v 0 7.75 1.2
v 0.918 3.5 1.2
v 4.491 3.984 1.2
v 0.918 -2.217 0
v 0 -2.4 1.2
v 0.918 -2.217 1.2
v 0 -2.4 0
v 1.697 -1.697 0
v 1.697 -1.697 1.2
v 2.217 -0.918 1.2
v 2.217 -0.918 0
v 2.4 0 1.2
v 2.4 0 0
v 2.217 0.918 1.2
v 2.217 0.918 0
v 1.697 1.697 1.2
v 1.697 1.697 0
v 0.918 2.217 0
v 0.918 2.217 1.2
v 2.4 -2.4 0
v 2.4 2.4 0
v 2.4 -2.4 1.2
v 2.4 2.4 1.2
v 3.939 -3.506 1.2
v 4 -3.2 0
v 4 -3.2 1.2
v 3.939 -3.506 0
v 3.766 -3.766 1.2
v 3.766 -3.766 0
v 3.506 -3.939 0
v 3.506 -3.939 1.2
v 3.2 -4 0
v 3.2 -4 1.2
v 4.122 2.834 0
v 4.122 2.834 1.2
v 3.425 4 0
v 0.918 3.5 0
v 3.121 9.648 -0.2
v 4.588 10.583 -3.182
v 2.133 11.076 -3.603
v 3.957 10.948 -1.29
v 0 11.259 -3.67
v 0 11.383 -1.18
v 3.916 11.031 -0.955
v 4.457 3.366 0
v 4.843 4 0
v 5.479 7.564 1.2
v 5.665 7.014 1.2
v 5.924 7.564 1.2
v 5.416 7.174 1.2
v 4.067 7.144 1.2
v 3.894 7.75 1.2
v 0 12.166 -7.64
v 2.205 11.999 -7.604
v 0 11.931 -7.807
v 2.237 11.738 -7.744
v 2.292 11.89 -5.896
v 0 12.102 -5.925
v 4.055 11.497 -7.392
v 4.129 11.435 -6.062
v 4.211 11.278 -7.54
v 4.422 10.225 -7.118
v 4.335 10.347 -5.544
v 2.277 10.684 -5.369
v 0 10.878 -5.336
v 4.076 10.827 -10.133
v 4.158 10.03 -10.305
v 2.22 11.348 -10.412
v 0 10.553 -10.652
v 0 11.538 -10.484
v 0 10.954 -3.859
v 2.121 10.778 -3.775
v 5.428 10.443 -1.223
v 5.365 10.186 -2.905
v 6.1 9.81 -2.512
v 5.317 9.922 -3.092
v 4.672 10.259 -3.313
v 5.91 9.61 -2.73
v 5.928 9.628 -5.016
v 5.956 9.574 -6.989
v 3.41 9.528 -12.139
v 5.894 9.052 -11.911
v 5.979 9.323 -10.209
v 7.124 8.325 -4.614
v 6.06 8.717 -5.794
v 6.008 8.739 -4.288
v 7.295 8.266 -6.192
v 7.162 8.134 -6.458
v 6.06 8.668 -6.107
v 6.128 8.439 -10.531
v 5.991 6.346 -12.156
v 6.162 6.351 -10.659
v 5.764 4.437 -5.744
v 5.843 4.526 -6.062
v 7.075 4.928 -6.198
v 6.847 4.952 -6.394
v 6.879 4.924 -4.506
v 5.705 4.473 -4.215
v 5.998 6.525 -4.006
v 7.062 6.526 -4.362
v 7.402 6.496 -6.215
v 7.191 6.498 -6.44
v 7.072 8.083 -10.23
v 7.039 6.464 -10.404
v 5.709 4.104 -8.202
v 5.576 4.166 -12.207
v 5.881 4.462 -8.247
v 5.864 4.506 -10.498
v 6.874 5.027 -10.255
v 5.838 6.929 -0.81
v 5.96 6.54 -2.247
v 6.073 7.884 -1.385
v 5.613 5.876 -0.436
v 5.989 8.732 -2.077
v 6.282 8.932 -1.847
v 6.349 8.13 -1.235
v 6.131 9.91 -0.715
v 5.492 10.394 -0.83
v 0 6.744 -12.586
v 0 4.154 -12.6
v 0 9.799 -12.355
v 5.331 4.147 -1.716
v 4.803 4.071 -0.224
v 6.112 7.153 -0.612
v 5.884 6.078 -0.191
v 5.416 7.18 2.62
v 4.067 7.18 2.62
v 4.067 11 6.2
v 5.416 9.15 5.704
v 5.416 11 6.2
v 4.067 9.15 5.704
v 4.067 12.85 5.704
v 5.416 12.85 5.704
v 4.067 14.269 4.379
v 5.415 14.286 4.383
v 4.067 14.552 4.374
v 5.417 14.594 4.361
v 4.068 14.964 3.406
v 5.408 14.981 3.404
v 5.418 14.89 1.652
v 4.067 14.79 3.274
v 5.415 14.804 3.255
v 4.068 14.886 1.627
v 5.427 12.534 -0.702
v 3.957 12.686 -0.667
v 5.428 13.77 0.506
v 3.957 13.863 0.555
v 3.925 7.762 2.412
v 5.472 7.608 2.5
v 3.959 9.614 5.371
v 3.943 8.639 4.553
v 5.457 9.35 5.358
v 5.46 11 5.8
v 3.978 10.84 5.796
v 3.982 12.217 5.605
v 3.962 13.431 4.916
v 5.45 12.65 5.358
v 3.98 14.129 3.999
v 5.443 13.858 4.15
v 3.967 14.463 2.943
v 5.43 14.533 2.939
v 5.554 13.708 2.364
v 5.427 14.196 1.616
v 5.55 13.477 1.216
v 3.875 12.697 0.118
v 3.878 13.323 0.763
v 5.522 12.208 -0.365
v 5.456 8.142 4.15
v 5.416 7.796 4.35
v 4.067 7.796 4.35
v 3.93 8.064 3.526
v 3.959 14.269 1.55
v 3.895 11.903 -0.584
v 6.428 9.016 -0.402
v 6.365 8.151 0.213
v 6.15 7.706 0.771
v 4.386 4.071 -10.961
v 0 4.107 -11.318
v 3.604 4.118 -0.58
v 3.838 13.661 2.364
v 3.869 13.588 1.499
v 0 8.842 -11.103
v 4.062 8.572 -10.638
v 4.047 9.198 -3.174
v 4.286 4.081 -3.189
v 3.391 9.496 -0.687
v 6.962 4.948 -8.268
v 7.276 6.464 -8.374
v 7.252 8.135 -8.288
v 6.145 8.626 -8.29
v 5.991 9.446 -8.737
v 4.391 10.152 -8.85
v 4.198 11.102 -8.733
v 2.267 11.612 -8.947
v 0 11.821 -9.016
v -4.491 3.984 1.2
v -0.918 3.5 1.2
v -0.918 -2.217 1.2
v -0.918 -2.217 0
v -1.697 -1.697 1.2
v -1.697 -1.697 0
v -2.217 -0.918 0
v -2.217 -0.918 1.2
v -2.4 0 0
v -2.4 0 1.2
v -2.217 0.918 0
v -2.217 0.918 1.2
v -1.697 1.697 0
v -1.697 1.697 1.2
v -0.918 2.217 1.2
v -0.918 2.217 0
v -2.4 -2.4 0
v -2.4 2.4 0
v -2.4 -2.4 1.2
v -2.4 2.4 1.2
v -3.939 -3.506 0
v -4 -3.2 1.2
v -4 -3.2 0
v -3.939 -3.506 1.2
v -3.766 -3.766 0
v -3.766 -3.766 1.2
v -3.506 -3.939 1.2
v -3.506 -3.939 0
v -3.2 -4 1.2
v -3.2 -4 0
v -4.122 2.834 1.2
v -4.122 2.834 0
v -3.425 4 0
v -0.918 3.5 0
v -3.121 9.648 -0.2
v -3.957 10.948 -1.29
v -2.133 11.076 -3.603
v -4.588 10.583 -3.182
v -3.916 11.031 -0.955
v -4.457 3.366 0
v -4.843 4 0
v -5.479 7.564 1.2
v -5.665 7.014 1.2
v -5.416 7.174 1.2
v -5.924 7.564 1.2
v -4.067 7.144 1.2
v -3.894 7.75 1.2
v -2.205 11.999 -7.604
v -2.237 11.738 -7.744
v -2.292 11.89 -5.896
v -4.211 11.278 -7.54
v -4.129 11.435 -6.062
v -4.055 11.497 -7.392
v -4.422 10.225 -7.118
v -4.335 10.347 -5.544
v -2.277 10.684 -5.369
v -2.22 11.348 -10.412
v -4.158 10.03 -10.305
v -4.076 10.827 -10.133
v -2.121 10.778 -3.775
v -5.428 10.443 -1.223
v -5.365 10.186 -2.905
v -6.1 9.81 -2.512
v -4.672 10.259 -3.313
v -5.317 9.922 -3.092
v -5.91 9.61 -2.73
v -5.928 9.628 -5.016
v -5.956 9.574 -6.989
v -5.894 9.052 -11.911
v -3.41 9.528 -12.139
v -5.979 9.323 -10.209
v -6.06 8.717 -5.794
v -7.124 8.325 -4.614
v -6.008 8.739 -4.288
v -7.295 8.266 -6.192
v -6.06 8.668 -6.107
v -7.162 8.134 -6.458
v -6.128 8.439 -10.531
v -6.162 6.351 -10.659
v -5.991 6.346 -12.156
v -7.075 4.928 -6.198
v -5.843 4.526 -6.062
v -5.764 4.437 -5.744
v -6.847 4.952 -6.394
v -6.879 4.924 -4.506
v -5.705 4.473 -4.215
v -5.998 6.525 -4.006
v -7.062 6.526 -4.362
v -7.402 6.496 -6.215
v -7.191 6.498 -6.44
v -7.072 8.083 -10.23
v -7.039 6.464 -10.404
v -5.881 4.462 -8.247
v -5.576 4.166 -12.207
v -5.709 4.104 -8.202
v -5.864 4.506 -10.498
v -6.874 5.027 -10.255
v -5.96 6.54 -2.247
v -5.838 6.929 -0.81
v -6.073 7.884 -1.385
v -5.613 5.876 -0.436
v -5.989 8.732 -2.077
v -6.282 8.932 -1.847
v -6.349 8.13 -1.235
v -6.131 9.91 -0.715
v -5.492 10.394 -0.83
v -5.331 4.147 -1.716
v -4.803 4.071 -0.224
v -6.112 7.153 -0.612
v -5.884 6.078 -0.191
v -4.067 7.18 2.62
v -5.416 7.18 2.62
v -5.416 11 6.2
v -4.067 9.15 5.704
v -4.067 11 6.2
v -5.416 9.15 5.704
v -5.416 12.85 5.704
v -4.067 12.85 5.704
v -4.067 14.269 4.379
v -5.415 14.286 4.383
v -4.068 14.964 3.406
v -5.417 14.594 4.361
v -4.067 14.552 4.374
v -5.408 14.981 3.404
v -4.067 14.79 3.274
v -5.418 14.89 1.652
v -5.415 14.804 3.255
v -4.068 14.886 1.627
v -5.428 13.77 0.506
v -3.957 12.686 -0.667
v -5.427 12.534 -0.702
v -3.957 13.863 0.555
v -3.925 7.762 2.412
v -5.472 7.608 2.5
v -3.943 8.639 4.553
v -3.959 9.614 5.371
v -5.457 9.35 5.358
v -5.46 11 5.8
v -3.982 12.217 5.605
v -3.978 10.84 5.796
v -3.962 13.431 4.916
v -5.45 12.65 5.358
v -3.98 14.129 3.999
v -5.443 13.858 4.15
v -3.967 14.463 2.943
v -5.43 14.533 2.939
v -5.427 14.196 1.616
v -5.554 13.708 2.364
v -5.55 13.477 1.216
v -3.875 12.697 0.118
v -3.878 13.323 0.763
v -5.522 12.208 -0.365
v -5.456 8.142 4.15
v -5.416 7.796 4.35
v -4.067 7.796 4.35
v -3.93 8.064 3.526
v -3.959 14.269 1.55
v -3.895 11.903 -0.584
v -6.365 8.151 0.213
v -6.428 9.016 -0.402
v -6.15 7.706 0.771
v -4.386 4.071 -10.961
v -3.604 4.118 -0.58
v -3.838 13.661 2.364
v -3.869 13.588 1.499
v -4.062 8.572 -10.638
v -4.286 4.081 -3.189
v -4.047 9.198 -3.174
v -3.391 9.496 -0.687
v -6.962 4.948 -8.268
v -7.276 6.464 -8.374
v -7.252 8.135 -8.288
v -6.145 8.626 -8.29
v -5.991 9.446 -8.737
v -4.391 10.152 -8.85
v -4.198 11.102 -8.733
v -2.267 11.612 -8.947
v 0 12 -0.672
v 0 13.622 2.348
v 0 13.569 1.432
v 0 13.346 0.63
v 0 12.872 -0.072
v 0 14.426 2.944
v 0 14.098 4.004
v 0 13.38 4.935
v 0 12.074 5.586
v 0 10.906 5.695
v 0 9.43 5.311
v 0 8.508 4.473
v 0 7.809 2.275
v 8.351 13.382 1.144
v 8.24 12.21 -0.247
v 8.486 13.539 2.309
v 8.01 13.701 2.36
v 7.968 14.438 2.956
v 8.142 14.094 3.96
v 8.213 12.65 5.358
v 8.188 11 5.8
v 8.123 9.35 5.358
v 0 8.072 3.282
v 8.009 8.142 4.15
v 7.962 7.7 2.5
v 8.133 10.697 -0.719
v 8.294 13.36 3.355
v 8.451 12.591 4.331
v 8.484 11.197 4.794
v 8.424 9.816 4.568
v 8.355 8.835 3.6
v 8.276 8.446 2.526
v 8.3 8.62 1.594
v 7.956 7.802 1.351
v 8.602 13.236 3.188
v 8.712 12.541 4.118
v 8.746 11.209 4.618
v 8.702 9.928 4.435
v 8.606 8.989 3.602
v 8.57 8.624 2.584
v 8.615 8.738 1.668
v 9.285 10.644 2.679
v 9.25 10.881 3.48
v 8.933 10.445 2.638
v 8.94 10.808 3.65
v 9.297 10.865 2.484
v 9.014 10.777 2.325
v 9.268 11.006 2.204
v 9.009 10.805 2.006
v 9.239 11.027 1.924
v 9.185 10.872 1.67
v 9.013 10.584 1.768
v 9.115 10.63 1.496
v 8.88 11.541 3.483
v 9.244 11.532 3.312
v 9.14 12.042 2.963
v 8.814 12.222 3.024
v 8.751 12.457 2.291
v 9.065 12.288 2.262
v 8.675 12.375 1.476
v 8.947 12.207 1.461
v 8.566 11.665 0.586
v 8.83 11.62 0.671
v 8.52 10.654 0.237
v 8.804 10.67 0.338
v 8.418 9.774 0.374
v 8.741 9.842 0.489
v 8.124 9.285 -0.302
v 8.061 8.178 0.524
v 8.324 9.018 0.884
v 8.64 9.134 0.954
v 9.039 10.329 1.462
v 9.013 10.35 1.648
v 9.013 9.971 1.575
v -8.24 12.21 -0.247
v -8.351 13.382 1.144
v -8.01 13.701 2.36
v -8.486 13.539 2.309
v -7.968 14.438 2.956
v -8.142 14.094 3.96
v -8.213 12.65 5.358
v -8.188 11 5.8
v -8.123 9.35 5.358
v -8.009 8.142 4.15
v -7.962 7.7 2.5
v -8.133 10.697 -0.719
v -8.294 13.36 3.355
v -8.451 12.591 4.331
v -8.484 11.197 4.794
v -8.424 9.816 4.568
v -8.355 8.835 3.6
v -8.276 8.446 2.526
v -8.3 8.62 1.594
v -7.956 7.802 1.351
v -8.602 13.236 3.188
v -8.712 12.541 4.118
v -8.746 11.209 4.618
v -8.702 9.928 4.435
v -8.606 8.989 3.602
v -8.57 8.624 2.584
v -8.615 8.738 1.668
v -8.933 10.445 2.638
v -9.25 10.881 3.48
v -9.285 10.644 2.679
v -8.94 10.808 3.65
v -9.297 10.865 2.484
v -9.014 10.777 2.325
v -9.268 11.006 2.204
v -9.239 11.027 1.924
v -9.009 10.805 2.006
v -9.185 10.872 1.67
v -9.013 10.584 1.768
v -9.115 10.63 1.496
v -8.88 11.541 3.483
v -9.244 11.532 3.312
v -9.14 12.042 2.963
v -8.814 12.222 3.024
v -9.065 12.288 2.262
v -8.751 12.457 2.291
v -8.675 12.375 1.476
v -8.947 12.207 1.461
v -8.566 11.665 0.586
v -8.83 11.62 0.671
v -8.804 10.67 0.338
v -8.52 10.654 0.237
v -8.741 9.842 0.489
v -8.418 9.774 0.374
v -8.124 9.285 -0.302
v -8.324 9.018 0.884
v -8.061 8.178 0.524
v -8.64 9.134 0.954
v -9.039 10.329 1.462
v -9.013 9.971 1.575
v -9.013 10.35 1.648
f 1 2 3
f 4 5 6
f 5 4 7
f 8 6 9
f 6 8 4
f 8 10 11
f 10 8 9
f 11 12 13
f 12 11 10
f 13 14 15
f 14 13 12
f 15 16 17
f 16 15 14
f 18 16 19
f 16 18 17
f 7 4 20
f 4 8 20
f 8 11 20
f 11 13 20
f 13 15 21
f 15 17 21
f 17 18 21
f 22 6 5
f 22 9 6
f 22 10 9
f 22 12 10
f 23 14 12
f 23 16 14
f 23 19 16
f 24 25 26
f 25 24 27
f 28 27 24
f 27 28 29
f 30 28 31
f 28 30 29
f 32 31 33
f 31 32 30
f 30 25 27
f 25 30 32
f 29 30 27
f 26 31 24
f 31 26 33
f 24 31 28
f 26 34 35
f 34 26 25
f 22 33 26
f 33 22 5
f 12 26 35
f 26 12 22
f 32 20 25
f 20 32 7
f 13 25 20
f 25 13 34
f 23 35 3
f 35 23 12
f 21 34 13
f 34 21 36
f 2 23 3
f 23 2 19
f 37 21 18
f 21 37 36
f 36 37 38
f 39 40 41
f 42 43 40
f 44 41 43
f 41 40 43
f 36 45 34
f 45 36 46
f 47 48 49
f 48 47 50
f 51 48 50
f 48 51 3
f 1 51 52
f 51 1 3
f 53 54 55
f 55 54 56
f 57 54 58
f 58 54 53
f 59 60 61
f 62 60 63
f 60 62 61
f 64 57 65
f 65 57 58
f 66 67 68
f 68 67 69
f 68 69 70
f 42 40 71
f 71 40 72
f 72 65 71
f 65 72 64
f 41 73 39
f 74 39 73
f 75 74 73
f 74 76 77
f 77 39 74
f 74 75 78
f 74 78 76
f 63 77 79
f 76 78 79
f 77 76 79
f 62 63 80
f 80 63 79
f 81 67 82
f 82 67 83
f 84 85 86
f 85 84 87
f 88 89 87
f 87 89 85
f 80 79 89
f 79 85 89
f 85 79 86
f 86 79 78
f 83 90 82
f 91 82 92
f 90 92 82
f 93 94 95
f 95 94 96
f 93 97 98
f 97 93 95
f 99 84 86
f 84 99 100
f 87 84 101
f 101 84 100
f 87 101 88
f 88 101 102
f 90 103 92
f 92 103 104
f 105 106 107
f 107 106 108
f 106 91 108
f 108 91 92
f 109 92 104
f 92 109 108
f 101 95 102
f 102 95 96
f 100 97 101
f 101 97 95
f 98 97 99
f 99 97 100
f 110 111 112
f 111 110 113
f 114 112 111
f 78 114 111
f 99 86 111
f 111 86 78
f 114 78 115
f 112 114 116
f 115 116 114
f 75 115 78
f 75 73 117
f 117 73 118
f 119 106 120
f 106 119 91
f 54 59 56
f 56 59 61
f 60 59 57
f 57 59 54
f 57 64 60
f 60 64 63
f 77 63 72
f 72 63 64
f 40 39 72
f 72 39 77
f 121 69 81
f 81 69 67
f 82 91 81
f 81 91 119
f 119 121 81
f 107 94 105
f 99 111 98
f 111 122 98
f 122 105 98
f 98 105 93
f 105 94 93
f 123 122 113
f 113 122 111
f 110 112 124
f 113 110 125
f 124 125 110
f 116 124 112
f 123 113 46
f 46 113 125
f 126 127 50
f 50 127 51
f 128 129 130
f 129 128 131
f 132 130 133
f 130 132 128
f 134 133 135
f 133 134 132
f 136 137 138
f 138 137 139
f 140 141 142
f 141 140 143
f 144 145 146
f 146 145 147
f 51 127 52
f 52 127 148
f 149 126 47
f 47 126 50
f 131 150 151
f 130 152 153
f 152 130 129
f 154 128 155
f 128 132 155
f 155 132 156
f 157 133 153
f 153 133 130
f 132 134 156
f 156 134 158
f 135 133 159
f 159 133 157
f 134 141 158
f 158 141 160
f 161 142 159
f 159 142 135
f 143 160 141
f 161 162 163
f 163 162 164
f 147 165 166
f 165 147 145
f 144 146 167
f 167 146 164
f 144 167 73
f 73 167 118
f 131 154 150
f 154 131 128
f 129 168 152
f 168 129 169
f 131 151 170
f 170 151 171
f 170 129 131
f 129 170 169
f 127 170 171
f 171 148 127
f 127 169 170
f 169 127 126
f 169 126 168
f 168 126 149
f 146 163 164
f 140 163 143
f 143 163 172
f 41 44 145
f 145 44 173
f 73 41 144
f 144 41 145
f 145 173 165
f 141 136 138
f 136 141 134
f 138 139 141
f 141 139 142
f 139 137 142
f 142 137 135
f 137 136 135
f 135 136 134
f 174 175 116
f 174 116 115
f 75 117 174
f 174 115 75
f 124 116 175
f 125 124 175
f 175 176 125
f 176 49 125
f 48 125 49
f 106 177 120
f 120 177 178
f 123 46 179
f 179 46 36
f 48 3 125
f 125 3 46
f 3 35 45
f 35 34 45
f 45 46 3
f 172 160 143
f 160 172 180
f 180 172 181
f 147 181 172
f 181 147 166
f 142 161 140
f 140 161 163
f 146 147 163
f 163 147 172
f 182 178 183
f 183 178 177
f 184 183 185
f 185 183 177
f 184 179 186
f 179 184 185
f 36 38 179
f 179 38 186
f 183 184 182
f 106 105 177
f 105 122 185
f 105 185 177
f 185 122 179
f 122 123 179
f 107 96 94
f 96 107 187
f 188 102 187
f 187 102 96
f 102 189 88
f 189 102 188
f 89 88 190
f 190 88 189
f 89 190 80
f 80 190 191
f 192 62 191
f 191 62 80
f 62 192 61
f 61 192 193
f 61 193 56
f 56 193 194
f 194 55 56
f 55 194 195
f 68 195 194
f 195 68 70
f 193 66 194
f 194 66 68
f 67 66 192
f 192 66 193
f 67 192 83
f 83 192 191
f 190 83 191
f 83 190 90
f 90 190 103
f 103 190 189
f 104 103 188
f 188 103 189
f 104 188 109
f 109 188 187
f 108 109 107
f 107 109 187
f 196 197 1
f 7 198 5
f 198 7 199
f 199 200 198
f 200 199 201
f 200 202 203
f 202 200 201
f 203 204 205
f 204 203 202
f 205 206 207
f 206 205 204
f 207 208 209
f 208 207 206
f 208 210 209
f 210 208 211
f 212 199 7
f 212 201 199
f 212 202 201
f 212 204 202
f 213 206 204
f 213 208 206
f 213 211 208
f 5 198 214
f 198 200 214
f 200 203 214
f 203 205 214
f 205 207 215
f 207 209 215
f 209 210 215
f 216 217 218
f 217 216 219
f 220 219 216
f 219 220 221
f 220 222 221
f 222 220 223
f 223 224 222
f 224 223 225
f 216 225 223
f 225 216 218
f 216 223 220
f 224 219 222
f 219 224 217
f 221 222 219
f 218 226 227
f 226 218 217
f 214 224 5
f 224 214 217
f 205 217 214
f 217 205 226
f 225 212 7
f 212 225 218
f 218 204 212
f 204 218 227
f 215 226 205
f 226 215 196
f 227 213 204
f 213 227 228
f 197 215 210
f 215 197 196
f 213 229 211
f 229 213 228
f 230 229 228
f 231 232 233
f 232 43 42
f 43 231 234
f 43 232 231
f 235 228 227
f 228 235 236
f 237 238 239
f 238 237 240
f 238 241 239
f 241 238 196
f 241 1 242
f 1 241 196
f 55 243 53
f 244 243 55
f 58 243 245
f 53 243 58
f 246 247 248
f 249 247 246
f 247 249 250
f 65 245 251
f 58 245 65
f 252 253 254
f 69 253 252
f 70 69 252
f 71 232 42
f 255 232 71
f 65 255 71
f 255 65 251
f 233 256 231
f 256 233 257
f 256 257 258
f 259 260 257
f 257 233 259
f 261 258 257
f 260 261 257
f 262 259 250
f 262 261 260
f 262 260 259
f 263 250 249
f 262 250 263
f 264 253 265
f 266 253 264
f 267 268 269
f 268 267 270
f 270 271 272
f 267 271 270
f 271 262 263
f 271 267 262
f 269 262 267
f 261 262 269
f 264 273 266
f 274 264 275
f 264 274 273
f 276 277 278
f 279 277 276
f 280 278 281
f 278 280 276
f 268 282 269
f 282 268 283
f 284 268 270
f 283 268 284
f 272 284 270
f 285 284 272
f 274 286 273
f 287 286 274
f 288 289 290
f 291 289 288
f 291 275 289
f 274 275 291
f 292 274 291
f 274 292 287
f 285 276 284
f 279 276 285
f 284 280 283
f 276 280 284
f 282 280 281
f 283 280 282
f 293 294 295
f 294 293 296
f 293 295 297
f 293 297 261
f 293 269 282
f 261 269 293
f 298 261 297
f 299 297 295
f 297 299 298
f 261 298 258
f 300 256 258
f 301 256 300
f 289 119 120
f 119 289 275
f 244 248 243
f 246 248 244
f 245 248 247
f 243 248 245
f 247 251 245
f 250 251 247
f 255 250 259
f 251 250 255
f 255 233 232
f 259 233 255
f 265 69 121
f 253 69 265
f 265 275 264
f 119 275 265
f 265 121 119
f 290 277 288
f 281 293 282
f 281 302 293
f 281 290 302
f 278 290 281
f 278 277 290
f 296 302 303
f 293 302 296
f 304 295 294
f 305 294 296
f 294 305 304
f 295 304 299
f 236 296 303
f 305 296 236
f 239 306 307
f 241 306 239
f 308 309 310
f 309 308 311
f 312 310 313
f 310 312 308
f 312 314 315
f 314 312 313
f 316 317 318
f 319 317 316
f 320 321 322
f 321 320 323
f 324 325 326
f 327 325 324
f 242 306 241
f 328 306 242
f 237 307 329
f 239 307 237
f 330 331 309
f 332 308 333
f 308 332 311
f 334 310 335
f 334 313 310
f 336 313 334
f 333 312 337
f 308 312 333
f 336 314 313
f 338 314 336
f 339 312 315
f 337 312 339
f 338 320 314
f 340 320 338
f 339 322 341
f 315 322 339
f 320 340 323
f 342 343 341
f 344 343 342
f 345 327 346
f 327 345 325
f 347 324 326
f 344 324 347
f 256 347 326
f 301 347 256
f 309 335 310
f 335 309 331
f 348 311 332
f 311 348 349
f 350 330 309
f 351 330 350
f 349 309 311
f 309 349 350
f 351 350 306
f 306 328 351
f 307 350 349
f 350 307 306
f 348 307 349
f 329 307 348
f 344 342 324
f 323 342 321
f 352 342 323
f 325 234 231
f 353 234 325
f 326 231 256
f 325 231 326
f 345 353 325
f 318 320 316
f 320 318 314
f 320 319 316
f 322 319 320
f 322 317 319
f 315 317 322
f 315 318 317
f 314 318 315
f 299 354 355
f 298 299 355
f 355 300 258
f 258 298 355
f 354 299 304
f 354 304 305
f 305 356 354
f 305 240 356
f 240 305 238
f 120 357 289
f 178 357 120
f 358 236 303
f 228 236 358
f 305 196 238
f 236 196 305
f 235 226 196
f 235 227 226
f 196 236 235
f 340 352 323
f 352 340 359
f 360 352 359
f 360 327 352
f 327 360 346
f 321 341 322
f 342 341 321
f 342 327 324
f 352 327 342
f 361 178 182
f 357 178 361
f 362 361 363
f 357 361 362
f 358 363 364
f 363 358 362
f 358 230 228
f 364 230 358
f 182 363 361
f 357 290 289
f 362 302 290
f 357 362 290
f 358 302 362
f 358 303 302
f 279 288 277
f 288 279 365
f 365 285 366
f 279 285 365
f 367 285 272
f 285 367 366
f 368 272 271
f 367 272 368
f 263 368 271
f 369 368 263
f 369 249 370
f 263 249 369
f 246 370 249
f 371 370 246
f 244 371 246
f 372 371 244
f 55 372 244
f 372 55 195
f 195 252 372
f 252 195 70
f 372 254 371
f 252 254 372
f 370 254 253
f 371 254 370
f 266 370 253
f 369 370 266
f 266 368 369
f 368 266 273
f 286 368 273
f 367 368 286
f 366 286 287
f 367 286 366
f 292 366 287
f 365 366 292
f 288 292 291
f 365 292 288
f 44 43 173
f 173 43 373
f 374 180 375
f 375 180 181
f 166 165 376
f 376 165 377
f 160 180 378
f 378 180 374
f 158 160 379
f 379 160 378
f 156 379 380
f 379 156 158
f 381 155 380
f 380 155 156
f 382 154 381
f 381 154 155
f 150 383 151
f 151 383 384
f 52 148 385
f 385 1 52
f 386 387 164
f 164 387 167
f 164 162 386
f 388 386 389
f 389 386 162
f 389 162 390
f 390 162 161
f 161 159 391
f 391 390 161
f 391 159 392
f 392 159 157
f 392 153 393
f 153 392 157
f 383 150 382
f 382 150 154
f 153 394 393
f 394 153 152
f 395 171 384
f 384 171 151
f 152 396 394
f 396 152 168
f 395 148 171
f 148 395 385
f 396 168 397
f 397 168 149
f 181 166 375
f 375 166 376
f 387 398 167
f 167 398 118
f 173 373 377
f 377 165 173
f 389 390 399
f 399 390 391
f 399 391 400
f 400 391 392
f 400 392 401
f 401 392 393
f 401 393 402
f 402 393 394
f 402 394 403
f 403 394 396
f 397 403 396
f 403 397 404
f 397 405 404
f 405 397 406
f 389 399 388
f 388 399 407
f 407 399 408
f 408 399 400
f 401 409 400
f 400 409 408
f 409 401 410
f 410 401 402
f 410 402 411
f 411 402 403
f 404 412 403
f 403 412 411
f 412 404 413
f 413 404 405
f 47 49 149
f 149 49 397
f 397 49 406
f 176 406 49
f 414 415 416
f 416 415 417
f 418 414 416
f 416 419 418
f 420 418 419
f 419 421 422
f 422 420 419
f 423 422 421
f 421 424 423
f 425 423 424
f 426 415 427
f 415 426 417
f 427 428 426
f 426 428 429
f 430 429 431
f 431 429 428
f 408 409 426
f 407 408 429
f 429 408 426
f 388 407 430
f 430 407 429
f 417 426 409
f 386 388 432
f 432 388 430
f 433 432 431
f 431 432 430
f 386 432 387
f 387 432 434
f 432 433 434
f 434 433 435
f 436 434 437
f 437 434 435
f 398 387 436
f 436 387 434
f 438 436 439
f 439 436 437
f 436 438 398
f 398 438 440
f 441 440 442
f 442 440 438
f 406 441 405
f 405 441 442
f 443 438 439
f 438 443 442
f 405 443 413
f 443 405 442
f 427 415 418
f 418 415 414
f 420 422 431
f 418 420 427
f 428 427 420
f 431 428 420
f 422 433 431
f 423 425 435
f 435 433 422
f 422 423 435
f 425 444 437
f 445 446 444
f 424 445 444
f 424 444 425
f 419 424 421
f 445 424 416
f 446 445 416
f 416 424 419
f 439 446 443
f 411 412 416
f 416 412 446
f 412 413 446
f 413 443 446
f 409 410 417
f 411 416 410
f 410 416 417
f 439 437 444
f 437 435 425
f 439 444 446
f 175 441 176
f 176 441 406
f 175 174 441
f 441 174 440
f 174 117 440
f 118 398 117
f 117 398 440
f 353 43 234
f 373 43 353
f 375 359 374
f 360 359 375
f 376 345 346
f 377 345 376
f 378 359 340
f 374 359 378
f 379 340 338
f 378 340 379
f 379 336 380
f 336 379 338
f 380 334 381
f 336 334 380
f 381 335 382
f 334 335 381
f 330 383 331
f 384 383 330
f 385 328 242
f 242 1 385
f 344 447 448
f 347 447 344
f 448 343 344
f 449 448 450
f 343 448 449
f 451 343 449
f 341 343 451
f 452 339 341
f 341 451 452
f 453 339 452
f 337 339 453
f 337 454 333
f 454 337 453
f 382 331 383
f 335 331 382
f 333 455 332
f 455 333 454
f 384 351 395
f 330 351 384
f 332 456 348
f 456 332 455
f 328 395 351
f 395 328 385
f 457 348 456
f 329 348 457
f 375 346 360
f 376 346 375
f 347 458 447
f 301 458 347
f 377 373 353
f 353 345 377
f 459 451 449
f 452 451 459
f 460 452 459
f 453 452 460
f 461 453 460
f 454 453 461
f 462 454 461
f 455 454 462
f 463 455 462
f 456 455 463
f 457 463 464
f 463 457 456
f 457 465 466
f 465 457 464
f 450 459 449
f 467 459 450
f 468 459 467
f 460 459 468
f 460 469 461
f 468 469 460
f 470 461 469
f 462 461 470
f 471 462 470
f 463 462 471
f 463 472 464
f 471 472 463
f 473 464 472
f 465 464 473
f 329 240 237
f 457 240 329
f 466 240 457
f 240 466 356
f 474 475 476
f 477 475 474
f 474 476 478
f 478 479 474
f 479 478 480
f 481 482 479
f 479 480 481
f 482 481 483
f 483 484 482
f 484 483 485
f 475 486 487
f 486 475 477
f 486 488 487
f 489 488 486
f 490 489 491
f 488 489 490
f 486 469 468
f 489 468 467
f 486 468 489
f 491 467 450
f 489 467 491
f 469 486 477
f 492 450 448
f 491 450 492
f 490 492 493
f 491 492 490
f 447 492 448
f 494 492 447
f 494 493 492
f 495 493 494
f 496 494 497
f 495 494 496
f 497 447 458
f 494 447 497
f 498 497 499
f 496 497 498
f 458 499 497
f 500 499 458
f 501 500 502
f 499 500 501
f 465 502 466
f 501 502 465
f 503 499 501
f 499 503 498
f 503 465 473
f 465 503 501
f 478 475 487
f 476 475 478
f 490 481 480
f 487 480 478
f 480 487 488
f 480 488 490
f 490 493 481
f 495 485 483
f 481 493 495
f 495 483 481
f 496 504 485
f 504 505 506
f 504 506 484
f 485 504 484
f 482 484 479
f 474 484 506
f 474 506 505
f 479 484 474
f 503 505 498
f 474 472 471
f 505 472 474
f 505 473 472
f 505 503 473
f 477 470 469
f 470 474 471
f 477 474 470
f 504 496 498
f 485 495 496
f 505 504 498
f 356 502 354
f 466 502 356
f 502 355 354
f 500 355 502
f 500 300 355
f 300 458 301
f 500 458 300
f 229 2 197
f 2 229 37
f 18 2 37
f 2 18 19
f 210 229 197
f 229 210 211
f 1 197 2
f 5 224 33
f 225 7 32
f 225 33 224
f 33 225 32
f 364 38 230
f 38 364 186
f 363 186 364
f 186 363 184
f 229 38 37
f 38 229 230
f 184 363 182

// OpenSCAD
use <../lib.scad>
use <../p/box3u2p.scad>
use <../p/rect2p.scad>
use <s/26073s01.scad>
use <s/26073s02.scad>
$fa=1; $fs=0.2;
function ldraw_lib__26073p02(realsolid=false) = [
// 0 Minifig Backpack with Three Pouches and Lime Bedroll Pattern
// 0 Name: 26073p02.dat
// 0 Author: Gerald Lasser [GeraldLasser]
// 0 !LDRAW_ORG Part UPDATE 2022-04
// 0 !LICENSE Licensed under CC BY 2.0 and CC BY 4.0 : see CAreadme.txt
// 
// 0 BFC CERTIFY CCW
  [0,"BFC","CERTIFY"],
  [0,"BFC","CCW"],
// 
// 0 !CATEGORY Minifig Neckwear
// 
// 0 !HISTORY 2022-07-18 [PTadmin] Official Update 2022-04
// 
// 
// 1 16 0 0 0 1 0 0 0 1 0 0 0 1 s\26073s01.dat
  [1,16,0,0,0,1,0,0,0,1,0,0,0,1, ldraw_lib__s__26073s01(realsolid)],
// 1 16 0 0 0 -1 0 0 0 1 0 0 0 1 s\26073s01.dat
  [1,16,0,0,0,-1,0,0,0,1,0,0,0,1, ldraw_lib__s__26073s01(realsolid)],
// 1 27 0 0 0 1 0 0 0 1 0 0 0 1 s\26073s02.dat
  [1,27,0,0,0,1,0,0,0,1,0,0,0,1, ldraw_lib__s__26073s02(realsolid)],
// 1 27 0 0 0 -1 0 0 0 1 0 0 0 1 s\26073s02.dat
  [1,27,0,0,0,-1,0,0,0,1,0,0,0,1, ldraw_lib__s__26073s02(realsolid)],
// 
// 0 BFC INVERTNEXT
  [0,"BFC","INVERTNEXT"],
// 1 16 0 -1.5 5.5434 0 0 2.2962 1.5 0 0 0 3.2066 0 box3u2p.dat
  [1,16,0,-1.5,5.5434,0,0,2.2962,1.5,0,0,0,3.2066,0, ldraw_lib__box3u2p(realsolid)],
// 3 16 0 -3 19.374 -2.2962 -3 8.75 2.2962 -3 8.75
  [3,16,0,-3,19.374,-2.2962,-3,8.75,2.2962,-3,8.75],
// 3 16 0 -3 -6 -8 -3 -10 8 -3 -10
  [3,16,0,-3,-6,-8,-3,-10,8,-3,-10],
// 3 16 -8 0 -10 0 0 -6 8 0 -10
  [3,16,-8,0,-10,0,0,-6,8,0,-10],
// 1 16 0 -1.5 -10 -8 0 0 0 0 1.5 0 1 0 rect2p.dat
  [1,16,0,-1.5,-10,-8,0,0,0,0,1.5,0,1,0, ldraw_lib__rect2p(realsolid)],
// 2 24 7.802 .499 24.119 -7.802 .499 24.119
  [2,24,7.802,.499,24.119,-7.802,.499,24.119],
// 
// 4 16 7.802 .499 24.119 -7.802 .499 24.119 -8.477 1.717 23.739 8.477 1.717 23.739
  [4,16,7.802,.499,24.119,-7.802,.499,24.119,-8.477,1.717,23.739,8.477,1.717,23.739],
// 4 16 10.117 7.934 22.995 8.477 1.717 23.739 -8.477 1.717 23.739 -10.117 7.934 22.995
  [4,16,10.117,7.934,22.995,8.477,1.717,23.739,-8.477,1.717,23.739,-10.117,7.934,22.995],
// 4 16 2.2962 0 8.75 -2.2962 0 8.75 -7.802 .499 24.119 7.802 .499 24.119
  [4,16,2.2962,0,8.75,-2.2962,0,8.75,-7.802,.499,24.119,7.802,.499,24.119],
// 3 16 10.117 7.934 22.995 -10.117 7.934 22.995 0 27.758 22.106
  [3,16,10.117,7.934,22.995,-10.117,7.934,22.995,0,27.758,22.106],
// 5 24 8.477 1.717 23.739 -8.477 1.717 23.739 7.802 .499 24.119 10.117 7.934 22.995
  [5,24,8.477,1.717,23.739,-8.477,1.717,23.739,7.802,.499,24.119,10.117,7.934,22.995],
// 5 24 -10.117 7.934 22.995 10.117 7.934 22.995 8.477 1.717 23.739 10.156 26.595 21.431
  [5,24,-10.117,7.934,22.995,10.117,7.934,22.995,8.477,1.717,23.739,10.156,26.595,21.431],
// 5 24 10.117 7.934 22.995 0 27.758 22.106 10.156 26.595 21.431 -10.117 7.934 22.995
  [5,24,10.117,7.934,22.995,0,27.758,22.106,10.156,26.595,21.431,-10.117,7.934,22.995],
// 5 24 0 27.758 22.106 -10.117 7.934 22.995 10.117 7.934 22.995 -10.156 26.595 21.431
  [5,24,0,27.758,22.106,-10.117,7.934,22.995,10.117,7.934,22.995,-10.156,26.595,21.431],
// 
// 0 // Seam
// 5 24 0 31.466 16.86 0 31.501 10.384 -14.977 30.389 15.864 13.94 30.517 10.414
  [5,24,0,31.466,16.86,0,31.501,10.384,-14.977,30.389,15.864,13.94,30.517,10.414],
// 5 24 0 30.888 24.497 0 31.466 16.86 8.525 30.348 23.819 -8.525 30.348 23.819
  [5,24,0,30.888,24.497,0,31.466,16.86,8.525,30.348,23.819,-8.525,30.348,23.819],
// 5 24 0 26.629 26.383 0 30.888 24.497 8.525 30.348 23.819 -8.525 30.348 23.819
  [5,24,0,26.629,26.383,0,30.888,24.497,8.525,30.348,23.819,-8.525,30.348,23.819],
// 5 24 0 26.629 26.383 0 26.211 28.844 5.549 26.03 28.371 -5.549 26.03 28.371
  [5,24,0,26.629,26.383,0,26.211,28.844,5.549,26.03,28.371,-5.549,26.03,28.371],
// 5 24 0 22.541 29.553 0 26.211 28.844 -5.667 22.367 29.03 5.549 26.03 28.371
  [5,24,0,22.541,29.553,0,26.211,28.844,-5.667,22.367,29.03,5.549,26.03,28.371],
// 5 24 0 22.541 29.553 0 19.518 29.827 -5.667 22.367 29.03 5.592 19.361 29.344
  [5,24,0,22.541,29.553,0,19.518,29.827,-5.667,22.367,29.03,5.592,19.361,29.344],
// 5 24 0 19.518 29.827 0 19.101 30.416 -5.512 19.01 29.997 5.512 19.01 29.997
  [5,24,0,19.518,29.827,0,19.101,30.416,-5.512,19.01,29.997,5.512,19.01,29.997],
// 5 24 0 14.812 30.254 0 19.101 30.416 5.512 19.01 29.997 -5.512 19.01 29.997
  [5,24,0,14.812,30.254,0,19.101,30.416,5.512,19.01,29.997,-5.512,19.01,29.997],
// 5 24 0 13.34 27.194 0 14.812 30.254 5.731 14.739 29.726 -5.731 14.739 29.726
  [5,24,0,13.34,27.194,0,14.812,30.254,5.731,14.739,29.726,-5.731,14.739,29.726],
// 5 24 0 13.34 27.194 0 9.647 27.386 5.303 9.437 26.946 -5.693 13.422 26.709
  [5,24,0,13.34,27.194,0,9.647,27.386,5.303,9.437,26.946,-5.693,13.422,26.709],
// 5 24 0 9.647 27.386 0 9.174 28.147 5.332 9.008 27.69 -5.332 9.008 27.69
  [5,24,0,9.647,27.386,0,9.174,28.147,5.332,9.008,27.69,-5.332,9.008,27.69],
// 5 24 0 9.174 28.147 0 2.95 28.458 -5.332 9.008 27.69 5.332 9.008 27.69
  [5,24,0,9.174,28.147,0,2.95,28.458,-5.332,9.008,27.69,5.332,9.008,27.69],
// 5 24 0 1.68 29.999 0 2.95 28.458 -9.738 1.231 29.578 9.738 1.231 29.578
  [5,24,0,1.68,29.999,0,2.95,28.458,-9.738,1.231,29.578,9.738,1.231,29.578],
// 5 24 0 .179 32.18 0 1.68 29.999 9.687 -.296 31.742 -9.738 1.231 29.578
  [5,24,0,.179,32.18,0,1.68,29.999,9.687,-.296,31.742,-9.738,1.231,29.578],
// 5 24 0 -1.576 33.365 0 .179 32.18 9.687 -.296 31.742 -9.687 -.296 31.742
  [5,24,0,-1.576,33.365,0,.179,32.18,9.687,-.296,31.742,-9.687,-.296,31.742],
// 5 24 0 -3.579 33.922 0 -1.576 33.365 9.696 -1.907 33.307 -9.696 -1.907 33.307
  [5,24,0,-3.579,33.922,0,-1.576,33.365,9.696,-1.907,33.307,-9.696,-1.907,33.307],
// 5 24 0 -3.579 33.922 0 -5.871 34.055 9.594 -5.911 34.153 -9.594 -5.911 34.153
  [5,24,0,-3.579,33.922,0,-5.871,34.055,9.594,-5.911,34.153,-9.594,-5.911,34.153],
// 5 24 0 -5.871 34.055 0 -7.36 36.065 9.594 -5.911 34.153 -9.594 -5.911 34.153
  [5,24,0,-5.871,34.055,0,-7.36,36.065,9.594,-5.911,34.153,-9.594,-5.911,34.153],
// 5 24 0 -10.009 35.245 0 -7.36 36.065 9.918 -7.358 36.157 -9.918 -7.358 36.157
  [5,24,0,-10.009,35.245,0,-7.36,36.065,9.918,-7.358,36.157,-9.918,-7.358,36.157],
// 5 24 0 -12.337 33.451 0 -10.009 35.245 9.904 -12.291 33.578 -9.95 -9.997 35.323
  [5,24,0,-12.337,33.451,0,-10.009,35.245,9.904,-12.291,33.578,-9.95,-9.997,35.323],
// 5 24 0 -13.966 30.184 0 -12.337 33.451 9.956 -14.012 30.543 -9.956 -14.012 30.543
  [5,24,0,-13.966,30.184,0,-12.337,33.451,9.956,-14.012,30.543,-9.956,-14.012,30.543],
// 5 24 0 -14.238 27.264 0 -13.966 30.184 -9.946 -14.489 27.1 9.946 -14.489 27.1
  [5,24,0,-14.238,27.264,0,-13.966,30.184,-9.946,-14.489,27.1,9.946,-14.489,27.1],
// 5 24 0 -5.688 19.523 0 -3 19.374 -9.812 -6.029 19.404 9.735 -3 19.374
  [5,24,0,-5.688,19.523,0,-3,19.374,-9.812,-6.029,19.404,9.735,-3,19.374],
// 5 24 0 -5.688 19.523 0 -8.205 20.18 -9.825 -8.814 20.16 9.812 -6.029 19.404
  [5,24,0,-5.688,19.523,0,-8.205,20.18,-9.825,-8.814,20.16,9.812,-6.029,19.404],
// 5 24 0 -8.205 20.18 0 -11.183 21.269 -9.825 -8.814 20.16 9.825 -8.814 20.16
  [5,24,0,-8.205,20.18,0,-11.183,21.269,-9.825,-8.814,20.16,9.825,-8.814,20.16],
// 5 24 0 -11.183 21.269 0 -13.278 23.574 -9.857 -11.382 21.598 9.857 -11.382 21.598
  [5,24,0,-11.183,21.269,0,-13.278,23.574,-9.857,-11.382,21.598,9.857,-11.382,21.598],
// 5 24 0 -13.278 23.574 0 -14.238 27.264 9.897 -13.428 24.034 -9.897 -13.428 24.034
  [5,24,0,-13.278,23.574,0,-14.238,27.264,9.897,-13.428,24.034,-9.897,-13.428,24.034],
// 5 24 0 28.295 10.267 0 31.501 10.384 10.966 27.403 10.178 -10.966 27.403 10.178
  [5,24,0,28.295,10.267,0,31.501,10.384,10.966,27.403,10.178,-10.966,27.403,10.178],
// 5 24 0 27.758 22.106 0 28.295 10.267 -10.156 26.595 21.431 10.156 26.595 21.431
  [5,24,0,27.758,22.106,0,28.295,10.267,-10.156,26.595,21.431,10.156,26.595,21.431],
// 
// 5 24 -7.802 .499 24.119 -2.2962 0 8.75 -8.563 0 10 7.802 .499 24.119
  [5,24,-7.802,.499,24.119,-2.2962,0,8.75,-8.563,0,10,7.802,.499,24.119],
// 5 24 7.802 .499 24.119 2.2962 0 8.75 -7.802 .499 24.119 8.563 0 10
  [5,24,7.802,.499,24.119,2.2962,0,8.75,-7.802,.499,24.119,8.563,0,10],
];
module ldraw_lib__26073p02(step=0, col=false, unit=2/5, alt=false, line=0.2, solid=!$preview)
    makepoly(ldraw_lib__26073p02(solid), step=step, col=col, unit=unit, alt=alt, line=line, solid=solid);
ldraw_lib__26073p02(line=0.2);
